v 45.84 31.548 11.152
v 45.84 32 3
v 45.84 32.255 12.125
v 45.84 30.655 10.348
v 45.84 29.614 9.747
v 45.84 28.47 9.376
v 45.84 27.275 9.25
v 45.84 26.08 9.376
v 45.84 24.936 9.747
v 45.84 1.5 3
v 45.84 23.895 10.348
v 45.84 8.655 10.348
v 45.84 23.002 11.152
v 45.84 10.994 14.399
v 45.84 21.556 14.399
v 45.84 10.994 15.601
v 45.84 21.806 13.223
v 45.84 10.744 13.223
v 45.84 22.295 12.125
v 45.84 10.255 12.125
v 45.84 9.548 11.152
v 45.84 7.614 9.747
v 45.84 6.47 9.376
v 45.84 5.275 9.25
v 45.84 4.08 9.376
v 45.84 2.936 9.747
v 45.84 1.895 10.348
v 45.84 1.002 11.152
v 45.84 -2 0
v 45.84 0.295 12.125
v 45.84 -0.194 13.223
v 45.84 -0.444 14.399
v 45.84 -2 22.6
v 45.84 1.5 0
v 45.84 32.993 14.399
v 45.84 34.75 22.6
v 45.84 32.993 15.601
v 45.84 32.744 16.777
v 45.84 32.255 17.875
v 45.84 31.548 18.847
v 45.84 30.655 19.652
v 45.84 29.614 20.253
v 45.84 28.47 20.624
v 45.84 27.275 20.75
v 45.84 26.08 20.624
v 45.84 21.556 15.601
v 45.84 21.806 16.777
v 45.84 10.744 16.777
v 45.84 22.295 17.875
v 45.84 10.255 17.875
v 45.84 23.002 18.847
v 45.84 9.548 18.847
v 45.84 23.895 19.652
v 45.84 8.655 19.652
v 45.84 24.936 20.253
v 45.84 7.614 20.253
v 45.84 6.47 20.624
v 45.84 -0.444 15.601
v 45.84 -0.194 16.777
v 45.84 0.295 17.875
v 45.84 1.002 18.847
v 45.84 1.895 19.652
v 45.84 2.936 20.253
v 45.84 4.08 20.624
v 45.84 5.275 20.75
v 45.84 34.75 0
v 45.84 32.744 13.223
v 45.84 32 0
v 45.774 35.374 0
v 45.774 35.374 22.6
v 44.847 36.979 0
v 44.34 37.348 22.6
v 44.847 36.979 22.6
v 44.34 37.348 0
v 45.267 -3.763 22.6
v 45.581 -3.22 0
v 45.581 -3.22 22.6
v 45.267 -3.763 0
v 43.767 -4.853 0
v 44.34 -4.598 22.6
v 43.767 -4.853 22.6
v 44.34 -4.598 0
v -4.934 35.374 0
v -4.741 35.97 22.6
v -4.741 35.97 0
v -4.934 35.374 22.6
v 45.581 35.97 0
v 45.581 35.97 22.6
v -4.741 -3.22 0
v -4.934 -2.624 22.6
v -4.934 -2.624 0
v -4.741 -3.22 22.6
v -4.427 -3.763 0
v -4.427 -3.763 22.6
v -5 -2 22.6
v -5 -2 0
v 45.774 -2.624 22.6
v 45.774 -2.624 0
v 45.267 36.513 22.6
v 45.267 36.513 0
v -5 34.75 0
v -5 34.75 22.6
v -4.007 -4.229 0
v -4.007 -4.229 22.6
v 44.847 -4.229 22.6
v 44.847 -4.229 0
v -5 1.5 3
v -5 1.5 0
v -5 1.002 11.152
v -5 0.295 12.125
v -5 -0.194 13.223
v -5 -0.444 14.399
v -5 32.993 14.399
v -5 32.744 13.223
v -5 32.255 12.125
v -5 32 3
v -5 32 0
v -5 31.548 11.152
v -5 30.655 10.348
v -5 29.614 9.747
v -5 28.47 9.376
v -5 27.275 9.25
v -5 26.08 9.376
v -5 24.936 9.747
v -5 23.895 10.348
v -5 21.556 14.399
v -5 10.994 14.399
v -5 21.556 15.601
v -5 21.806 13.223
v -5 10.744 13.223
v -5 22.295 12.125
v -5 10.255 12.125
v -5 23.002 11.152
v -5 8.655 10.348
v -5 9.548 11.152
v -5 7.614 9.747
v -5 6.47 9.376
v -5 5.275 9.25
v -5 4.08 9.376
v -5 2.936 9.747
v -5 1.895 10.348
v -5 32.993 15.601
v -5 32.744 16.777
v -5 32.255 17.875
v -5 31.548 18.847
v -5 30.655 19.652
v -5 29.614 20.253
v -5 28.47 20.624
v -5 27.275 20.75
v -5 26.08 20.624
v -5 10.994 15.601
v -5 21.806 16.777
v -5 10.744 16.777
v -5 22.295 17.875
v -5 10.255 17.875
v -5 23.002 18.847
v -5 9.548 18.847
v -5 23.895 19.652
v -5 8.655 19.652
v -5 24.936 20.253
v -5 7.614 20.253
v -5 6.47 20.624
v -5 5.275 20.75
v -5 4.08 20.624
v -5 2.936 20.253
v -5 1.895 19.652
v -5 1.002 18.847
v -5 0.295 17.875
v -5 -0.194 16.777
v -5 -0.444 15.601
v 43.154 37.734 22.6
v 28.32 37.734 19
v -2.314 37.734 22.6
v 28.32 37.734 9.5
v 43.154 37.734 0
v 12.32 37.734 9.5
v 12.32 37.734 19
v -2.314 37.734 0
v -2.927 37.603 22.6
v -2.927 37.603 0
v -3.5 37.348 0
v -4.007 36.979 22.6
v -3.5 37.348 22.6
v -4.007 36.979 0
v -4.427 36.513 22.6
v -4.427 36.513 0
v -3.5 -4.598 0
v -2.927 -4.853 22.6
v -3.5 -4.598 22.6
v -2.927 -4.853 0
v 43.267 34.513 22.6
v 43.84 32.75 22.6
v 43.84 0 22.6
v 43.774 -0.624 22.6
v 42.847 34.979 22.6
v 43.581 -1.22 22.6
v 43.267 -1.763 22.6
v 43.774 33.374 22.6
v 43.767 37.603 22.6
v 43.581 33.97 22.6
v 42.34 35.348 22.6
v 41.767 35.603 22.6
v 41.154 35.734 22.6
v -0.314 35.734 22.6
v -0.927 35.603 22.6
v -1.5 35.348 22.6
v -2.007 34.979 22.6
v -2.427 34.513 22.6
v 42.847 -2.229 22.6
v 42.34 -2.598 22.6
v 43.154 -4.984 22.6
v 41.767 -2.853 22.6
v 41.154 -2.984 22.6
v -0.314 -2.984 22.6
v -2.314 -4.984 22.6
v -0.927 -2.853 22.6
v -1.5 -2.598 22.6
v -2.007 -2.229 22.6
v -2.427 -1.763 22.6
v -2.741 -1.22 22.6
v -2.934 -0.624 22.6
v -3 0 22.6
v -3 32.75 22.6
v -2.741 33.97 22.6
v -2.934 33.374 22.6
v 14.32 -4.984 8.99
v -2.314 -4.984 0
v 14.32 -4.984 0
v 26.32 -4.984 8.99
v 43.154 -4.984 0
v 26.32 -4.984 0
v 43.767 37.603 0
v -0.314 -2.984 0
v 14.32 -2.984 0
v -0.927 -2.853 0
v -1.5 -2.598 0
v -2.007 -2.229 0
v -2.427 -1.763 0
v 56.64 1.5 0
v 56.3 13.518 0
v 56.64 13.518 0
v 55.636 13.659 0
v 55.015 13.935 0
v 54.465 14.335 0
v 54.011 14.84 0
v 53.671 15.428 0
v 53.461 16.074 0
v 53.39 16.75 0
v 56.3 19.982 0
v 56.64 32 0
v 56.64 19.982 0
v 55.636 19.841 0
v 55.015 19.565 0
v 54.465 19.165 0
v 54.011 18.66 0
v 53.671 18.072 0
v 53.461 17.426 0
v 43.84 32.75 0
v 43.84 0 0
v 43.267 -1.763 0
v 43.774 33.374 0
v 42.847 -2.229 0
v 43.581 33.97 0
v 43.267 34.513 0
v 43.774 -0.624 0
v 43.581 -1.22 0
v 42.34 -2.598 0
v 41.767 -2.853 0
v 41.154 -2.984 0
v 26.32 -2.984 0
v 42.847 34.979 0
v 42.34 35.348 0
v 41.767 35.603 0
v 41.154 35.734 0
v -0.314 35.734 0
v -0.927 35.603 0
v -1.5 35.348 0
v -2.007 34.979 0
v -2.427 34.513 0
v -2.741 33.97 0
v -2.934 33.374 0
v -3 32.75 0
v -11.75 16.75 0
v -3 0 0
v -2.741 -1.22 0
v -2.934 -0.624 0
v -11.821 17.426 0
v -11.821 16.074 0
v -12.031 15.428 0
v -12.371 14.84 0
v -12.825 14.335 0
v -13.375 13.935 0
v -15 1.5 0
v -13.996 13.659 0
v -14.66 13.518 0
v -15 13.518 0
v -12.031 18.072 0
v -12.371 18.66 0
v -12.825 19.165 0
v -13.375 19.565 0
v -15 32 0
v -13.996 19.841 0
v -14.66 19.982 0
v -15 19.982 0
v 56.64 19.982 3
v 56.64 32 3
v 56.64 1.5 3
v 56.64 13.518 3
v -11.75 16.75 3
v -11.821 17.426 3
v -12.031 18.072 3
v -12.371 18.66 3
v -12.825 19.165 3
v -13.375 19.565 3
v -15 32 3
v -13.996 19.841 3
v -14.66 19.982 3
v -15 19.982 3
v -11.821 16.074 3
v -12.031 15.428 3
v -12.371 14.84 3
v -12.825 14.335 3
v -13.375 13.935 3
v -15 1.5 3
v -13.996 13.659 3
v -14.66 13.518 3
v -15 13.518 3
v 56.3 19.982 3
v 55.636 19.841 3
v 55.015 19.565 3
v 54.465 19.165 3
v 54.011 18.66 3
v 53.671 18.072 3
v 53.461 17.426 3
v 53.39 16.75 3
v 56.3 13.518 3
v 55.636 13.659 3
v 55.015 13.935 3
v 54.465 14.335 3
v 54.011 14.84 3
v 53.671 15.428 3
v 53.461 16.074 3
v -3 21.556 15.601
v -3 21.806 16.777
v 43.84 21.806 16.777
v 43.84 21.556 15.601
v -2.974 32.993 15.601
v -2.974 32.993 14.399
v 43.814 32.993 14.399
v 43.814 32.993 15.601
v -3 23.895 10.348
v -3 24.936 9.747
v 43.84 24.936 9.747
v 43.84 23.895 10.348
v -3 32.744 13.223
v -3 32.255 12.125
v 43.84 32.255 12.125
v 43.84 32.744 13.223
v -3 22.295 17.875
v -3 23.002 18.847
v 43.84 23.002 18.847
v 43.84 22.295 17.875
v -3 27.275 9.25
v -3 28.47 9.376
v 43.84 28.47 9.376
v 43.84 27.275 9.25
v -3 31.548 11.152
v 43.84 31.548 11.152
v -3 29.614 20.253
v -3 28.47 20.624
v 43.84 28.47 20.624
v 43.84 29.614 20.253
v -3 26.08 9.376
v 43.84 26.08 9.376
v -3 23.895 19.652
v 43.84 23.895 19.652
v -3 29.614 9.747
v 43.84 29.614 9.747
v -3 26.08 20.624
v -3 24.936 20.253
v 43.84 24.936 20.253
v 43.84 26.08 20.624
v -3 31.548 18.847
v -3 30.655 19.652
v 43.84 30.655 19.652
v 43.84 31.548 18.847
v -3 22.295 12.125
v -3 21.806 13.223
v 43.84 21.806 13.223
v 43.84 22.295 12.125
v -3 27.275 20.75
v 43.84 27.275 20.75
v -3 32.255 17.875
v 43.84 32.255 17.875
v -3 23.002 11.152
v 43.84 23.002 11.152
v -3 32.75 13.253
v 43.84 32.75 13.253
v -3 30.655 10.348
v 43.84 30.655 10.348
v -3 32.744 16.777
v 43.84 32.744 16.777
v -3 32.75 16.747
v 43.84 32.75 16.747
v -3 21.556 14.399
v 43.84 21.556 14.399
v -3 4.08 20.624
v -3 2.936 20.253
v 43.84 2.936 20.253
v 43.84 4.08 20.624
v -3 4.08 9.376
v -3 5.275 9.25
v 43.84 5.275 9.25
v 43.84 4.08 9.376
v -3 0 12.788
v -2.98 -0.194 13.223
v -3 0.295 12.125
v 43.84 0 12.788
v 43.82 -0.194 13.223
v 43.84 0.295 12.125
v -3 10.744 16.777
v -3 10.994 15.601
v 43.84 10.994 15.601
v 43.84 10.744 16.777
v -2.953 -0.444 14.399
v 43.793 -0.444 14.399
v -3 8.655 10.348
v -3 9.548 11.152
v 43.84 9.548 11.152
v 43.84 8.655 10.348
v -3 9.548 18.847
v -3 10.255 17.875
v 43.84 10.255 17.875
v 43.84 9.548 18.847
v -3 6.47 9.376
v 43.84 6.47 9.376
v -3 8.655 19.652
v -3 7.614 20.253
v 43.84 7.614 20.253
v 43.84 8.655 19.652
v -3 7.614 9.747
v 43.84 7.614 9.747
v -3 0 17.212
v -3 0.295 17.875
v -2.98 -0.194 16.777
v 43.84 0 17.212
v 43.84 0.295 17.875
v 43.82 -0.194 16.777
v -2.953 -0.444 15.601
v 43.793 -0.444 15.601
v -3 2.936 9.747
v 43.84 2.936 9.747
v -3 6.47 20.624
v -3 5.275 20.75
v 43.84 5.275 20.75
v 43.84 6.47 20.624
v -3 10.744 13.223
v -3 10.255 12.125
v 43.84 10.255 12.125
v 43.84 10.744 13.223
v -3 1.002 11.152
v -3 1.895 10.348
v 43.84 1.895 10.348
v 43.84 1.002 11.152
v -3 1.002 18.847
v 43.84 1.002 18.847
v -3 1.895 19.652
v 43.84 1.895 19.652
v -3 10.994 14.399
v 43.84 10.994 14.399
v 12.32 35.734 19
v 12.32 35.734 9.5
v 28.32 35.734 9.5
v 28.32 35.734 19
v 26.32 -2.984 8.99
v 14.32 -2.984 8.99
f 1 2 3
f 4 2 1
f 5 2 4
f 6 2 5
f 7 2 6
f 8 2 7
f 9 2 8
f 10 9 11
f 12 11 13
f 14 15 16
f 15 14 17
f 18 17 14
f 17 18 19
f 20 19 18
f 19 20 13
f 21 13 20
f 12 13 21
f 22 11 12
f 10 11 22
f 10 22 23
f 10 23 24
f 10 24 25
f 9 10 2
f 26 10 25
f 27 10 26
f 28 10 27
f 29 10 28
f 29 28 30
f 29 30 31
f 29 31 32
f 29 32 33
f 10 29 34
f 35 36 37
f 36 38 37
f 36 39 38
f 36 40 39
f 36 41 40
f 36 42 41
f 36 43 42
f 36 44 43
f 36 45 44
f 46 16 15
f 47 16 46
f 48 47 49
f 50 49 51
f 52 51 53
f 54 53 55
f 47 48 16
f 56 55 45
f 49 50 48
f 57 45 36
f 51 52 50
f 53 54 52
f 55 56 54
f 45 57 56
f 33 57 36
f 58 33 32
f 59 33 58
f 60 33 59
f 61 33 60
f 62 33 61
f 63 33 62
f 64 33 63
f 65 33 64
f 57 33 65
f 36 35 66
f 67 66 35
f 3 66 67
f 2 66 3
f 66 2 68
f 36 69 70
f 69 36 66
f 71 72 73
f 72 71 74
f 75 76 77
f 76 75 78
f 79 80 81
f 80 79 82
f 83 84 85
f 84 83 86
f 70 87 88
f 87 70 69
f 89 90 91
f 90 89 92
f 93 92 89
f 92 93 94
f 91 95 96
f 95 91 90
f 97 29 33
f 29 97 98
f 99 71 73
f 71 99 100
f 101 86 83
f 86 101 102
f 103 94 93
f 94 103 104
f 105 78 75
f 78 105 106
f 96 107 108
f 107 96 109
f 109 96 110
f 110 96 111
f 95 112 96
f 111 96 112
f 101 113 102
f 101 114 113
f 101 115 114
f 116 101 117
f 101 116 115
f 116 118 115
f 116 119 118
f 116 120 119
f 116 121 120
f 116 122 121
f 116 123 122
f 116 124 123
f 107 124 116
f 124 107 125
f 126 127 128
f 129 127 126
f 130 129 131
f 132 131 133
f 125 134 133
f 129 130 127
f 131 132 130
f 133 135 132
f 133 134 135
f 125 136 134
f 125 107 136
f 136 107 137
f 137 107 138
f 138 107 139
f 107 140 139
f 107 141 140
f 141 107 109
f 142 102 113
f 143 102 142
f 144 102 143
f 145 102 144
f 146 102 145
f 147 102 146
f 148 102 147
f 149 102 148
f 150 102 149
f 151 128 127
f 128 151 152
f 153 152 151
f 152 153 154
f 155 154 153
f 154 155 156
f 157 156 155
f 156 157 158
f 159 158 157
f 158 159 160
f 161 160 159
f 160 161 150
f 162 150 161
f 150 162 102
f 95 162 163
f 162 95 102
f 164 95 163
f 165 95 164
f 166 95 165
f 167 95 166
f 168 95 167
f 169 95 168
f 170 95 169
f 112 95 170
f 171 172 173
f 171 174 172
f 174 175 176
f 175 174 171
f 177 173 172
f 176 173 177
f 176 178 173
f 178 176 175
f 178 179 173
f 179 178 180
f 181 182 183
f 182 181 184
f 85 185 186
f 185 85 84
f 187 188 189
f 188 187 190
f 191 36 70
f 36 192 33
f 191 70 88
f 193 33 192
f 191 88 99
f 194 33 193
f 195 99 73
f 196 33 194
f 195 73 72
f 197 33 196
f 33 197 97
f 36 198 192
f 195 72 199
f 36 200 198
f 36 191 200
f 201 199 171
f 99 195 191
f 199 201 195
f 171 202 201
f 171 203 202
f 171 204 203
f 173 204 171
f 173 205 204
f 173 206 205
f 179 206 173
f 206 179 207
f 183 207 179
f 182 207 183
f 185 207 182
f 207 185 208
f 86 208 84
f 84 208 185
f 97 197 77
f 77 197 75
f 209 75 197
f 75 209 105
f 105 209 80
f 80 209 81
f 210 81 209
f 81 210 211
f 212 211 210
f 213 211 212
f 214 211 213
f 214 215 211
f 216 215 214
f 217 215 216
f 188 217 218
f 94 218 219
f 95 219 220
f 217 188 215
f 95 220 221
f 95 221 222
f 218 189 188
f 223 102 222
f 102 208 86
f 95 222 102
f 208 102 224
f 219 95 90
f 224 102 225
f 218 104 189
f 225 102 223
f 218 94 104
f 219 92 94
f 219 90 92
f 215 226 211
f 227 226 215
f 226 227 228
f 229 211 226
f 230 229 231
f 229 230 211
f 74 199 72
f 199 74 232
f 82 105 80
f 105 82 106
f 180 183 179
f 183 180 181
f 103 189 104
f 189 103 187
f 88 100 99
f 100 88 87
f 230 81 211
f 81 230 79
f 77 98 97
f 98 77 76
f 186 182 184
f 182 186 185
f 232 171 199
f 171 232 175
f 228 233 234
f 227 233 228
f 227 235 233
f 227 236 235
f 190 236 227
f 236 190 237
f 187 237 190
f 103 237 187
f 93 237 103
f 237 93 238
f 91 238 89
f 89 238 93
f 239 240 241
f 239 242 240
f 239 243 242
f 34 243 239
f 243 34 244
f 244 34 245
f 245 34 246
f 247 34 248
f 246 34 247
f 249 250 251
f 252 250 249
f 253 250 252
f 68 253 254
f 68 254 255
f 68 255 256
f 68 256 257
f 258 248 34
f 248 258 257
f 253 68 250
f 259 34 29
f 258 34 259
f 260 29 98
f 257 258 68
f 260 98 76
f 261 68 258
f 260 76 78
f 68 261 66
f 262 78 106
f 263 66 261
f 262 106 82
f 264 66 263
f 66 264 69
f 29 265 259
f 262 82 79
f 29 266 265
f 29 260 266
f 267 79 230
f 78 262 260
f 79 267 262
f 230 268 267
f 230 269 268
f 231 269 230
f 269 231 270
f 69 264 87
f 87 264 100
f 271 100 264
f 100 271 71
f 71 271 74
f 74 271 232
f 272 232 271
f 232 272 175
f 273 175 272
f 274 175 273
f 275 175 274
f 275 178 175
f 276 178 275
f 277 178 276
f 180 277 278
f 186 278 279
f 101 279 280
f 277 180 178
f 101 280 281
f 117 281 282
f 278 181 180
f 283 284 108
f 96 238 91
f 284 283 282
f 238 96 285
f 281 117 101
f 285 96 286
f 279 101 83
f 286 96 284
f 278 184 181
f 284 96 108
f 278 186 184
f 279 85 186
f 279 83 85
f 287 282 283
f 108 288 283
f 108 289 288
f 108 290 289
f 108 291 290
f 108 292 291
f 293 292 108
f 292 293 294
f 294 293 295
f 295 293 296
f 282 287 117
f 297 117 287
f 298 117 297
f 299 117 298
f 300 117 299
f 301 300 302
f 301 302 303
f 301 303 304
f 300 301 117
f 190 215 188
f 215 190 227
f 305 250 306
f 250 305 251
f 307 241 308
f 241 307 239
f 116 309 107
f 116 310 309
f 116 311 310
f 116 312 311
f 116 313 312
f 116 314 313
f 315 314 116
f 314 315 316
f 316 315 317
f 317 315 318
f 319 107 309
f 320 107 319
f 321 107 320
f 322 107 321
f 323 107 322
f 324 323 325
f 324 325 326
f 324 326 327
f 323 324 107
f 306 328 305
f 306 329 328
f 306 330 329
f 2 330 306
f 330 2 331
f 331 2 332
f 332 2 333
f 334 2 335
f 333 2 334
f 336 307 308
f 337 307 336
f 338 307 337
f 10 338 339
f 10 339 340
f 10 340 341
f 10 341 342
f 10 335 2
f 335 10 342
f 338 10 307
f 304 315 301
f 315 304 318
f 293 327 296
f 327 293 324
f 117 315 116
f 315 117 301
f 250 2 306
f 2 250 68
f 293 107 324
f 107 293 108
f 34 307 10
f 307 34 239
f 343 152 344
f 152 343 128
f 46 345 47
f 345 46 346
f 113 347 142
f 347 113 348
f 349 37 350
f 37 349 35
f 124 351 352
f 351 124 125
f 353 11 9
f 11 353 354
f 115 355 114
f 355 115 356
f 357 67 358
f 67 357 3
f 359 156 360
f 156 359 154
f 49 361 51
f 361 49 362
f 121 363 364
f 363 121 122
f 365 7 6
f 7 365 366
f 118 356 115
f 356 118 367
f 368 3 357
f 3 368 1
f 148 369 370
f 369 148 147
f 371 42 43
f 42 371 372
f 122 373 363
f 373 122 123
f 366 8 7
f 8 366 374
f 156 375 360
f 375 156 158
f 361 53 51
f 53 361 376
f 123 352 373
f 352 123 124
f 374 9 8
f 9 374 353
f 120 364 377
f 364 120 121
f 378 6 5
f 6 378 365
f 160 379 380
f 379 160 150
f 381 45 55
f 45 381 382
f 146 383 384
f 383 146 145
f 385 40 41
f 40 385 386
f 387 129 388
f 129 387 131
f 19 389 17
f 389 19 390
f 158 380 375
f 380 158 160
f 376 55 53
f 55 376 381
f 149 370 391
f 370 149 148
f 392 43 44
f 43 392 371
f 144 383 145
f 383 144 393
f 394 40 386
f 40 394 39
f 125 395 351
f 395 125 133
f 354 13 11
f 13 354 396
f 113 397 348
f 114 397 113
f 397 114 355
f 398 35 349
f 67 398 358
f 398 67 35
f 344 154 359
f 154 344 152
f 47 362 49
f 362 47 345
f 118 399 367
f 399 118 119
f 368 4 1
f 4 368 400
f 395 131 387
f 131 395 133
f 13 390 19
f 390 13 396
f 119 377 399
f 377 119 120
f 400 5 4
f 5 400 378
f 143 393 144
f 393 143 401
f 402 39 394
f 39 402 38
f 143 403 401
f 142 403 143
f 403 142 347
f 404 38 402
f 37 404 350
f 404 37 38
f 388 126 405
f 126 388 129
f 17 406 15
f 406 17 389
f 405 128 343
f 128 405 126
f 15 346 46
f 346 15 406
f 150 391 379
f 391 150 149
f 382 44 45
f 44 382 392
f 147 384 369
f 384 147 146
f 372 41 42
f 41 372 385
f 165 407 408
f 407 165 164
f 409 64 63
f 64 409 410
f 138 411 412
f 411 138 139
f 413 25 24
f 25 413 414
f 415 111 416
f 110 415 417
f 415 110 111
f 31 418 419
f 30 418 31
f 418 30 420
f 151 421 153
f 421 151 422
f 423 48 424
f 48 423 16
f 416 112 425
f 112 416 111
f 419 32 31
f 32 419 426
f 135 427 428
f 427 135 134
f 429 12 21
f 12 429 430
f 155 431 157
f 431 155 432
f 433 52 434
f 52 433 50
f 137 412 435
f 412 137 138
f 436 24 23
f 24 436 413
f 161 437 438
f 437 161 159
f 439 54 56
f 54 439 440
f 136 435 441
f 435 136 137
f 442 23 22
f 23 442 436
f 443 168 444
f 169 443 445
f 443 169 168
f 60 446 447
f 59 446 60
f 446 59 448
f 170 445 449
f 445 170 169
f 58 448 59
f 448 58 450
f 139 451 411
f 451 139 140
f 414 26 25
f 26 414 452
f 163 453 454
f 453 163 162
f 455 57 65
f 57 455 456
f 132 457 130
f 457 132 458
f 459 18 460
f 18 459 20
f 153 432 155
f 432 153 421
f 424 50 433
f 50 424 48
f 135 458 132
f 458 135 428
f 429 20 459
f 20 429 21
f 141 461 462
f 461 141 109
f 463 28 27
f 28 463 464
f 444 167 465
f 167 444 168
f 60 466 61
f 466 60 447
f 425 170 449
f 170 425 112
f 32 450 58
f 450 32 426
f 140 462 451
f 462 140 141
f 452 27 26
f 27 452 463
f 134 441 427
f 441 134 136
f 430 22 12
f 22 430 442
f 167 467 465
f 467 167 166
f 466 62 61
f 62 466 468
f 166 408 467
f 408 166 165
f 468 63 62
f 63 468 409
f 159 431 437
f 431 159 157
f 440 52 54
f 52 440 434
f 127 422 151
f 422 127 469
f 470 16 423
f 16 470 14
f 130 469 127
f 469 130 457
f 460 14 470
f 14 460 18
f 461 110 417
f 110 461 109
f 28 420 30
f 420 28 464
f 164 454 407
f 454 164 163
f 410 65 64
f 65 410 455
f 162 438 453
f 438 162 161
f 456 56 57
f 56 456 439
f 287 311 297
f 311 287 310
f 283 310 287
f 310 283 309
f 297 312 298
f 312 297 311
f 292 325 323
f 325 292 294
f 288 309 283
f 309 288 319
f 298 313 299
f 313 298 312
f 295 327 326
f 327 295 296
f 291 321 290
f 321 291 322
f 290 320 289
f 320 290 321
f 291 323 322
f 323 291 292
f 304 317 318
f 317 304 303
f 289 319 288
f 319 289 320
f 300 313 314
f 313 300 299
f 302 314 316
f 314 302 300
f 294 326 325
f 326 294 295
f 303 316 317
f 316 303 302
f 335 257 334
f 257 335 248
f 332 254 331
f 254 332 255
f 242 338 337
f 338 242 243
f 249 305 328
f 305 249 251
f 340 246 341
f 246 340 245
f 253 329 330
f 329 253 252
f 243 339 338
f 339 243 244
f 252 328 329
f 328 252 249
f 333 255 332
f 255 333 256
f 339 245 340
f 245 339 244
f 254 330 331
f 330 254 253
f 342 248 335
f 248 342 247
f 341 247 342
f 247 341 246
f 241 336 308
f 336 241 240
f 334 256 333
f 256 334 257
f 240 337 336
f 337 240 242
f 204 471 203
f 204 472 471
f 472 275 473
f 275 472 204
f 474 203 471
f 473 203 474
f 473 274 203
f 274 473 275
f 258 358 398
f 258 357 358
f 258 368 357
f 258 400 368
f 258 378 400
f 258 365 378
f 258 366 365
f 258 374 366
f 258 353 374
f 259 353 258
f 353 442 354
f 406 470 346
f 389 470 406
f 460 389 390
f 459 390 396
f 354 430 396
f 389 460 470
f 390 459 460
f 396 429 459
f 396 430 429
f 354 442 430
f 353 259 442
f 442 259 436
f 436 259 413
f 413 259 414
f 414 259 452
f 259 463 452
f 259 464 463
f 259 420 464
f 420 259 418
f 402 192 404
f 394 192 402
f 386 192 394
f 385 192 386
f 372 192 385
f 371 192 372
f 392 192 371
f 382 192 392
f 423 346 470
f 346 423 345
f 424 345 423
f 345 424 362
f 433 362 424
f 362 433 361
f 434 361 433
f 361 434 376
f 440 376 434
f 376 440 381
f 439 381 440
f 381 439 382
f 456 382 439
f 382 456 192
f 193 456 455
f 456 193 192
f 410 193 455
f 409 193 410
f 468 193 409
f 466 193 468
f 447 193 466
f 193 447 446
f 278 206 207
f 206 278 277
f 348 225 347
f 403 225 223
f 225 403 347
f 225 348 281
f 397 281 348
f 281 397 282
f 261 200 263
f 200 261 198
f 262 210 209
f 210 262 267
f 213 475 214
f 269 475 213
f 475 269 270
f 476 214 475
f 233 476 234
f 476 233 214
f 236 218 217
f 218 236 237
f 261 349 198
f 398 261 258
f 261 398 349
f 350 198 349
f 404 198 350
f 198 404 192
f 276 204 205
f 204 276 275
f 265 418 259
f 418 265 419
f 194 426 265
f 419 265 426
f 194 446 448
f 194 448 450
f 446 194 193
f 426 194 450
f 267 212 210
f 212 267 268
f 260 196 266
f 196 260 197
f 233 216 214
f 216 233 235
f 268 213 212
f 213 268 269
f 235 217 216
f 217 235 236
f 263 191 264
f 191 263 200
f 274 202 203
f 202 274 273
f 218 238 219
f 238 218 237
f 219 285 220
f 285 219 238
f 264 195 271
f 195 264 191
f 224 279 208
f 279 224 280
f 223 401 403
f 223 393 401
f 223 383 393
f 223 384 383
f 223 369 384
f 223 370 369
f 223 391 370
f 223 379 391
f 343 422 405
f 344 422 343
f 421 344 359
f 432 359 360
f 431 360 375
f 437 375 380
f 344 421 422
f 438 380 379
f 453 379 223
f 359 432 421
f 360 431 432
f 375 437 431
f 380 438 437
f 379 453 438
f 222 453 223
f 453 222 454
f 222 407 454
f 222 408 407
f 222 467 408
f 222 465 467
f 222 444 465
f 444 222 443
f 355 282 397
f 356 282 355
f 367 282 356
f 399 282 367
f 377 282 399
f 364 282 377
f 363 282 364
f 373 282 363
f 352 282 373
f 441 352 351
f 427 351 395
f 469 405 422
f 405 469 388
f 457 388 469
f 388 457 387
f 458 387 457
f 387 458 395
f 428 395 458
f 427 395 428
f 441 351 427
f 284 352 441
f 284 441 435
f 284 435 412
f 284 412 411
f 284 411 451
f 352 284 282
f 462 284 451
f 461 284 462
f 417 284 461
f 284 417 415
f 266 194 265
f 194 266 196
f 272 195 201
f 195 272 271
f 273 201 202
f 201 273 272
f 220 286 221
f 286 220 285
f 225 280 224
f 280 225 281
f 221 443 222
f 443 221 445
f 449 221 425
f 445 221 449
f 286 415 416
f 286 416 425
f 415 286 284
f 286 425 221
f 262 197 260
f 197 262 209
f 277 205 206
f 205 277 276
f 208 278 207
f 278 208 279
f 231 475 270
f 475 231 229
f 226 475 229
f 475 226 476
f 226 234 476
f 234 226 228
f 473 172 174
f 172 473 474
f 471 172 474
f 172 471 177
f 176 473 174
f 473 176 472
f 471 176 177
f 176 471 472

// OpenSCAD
// file: ../src/IMU_CAN_adapter.scad
include <../parameters.scad>

IMU_diameter = 6;
IMU_width = 38.55;
IMU_height = 22.6;
IMU_length = 46.64;

cable_dia = 10.5+1;
cable_height = 15;
cable_gap = 22;

left_conn_width = 12;
left_conn_height = 9;

right_conn_width = 16;
right_conn_height = 9.5;
right_conn_bot_gap = 7.5;

module IMU_CAN_adapter() {
	difference() {
		// whole body
		union() {
			translate([-2, -2, 0])
			minkowski() {
				cube([IMU_length-IMU_diameter+4.2, IMU_width-IMU_diameter+4.2, 1]);
				cylinder(d=6, h=IMU_height-1, $fn=30);
			}

			translate([-5-10, IMU_diameter/4, 0])
			cube([IMU_length+5+20, ALU_profile_width, 3]);
		}

		// holding screws
		translate([-5-10, ALU_profile_width/2+IMU_diameter/4, -1])
		cylinder(d=M6_screw_diameter, h=5, $fn=30);

		translate([IMU_length+10, ALU_profile_width/2+IMU_diameter/4, -1])
		cylinder(d=M6_screw_diameter, h=5, $fn=30);

		// IMU inside cutout
		translate([0, 0, -1])
		minkowski() {
			cube([IMU_length-IMU_diameter+0.2, IMU_width-IMU_diameter+0.2, 1]);
			cylinder(d=6, h=IMU_height+1, $fn=30);
		}

		// cable holes
		translate([0, 0, cable_height])
		union() {
			rotate([0, 90, 0])
			translate([0, (IMU_width-IMU_diameter+cable_gap)/2, -10])
			cylinder(d=cable_dia, h=IMU_length+10, $fn=30);

			rotate([0, 90, 0])
			translate([0, (IMU_width-IMU_diameter-cable_gap)/2, -10])
			cylinder(d=cable_dia, h=IMU_length+10, $fn=30);
		}

		// left connector hole
		translate([-3+IMU_length/2-left_conn_width/2, -5, -.01])
		cube([left_conn_width, 10, left_conn_height]);

		// right connector hole
		translate([-3+IMU_length/2-right_conn_width/2, -5+IMU_width, right_conn_height])
		cube([right_conn_width, 10, right_conn_height]);
	}
}

IMU_CAN_adapter();
// file: ../parameters.scad
maximum_printable_size = 150;

layer_thickness = 0.2;
base_patern = 10;
global_clearance = 0.2;
clearance = global_clearance;


//Screw diameter and nut for M10 [mm]
M10_screw_diameter = 10.4;
M10_head_height = 10;
M10_head_diameter = 16+0.5;
M10_nut_height = 10.5;
M10_nut_diameter = 25.5;
M10_nut_pocket = 22.3;

//Screw diameter for M8 [mm]
M8_screw_diameter = 8.6;
M8_head_height = 8;
M8_head_diameter = 13.5;
M8_nut_height = 7.5;
M8_square_nut_thin_height = 4.5;
M8_nut_diameter = 14.4 + 0.5;
M8_nut_pocket = 13 + 0.5;
M8_washer_diameter = 16;
M8_washer_thickness = 1.5;


//Screw diameter and nut for M6 [mm]
M6_screw_diameter=6.5;
M6_head_diameter = 10+0.5;
M6_head_height = 6;
M6_nut_height = 4.9;
M6_nut_diameter = 11.8;
M6_nut_pocket = 10.4;
M6_square_nut_height = 3;
M6_square_nut_diameter = 10;
M6_washer_thickness = 1.6;

//Screw diameter and nut for M5 [mm]
M5_screw_diameter=5.5;
M5_head_height = 5;
M5_head_diameter = 13+0.5;
M5_nut_height = 4.5;
M5_nut_diameter = 9.4;
M5_nut_pocket = 8.4;

//Screw diameter and nut for M4 [mm]
M4_screw_diameter=4.5;
M4_screw_head_height = 4;
M4_nut_height = 3.2;
M4_nut_diameter = 8.4;
M4_nut_pocket = 7.5;

//Screw diameter and nut for M3 [mm]
M3_screw_diameter = 3.2;
M3_nut_height = 2.7;
M3_nut_diameter = 6.6;
M3_nut_pocket = 5.6;
M3_screw_head_height = 3;

//Screw diameter and nut for M2,5 [mm]
M2_5_screw_diameter = 2.7;
M2_5_nut_height = 2.3;
M2_5_nut_diameter = 6;
M2_5_nut_pocket = 5.5;

// kulove lozisko

bearing_efsm_08_h = 33+1;
bearing_efsm_08_m = 22;
bearing_efsm_08_db = 18;
bearing_efsm_08_ag = 10.5;
bearing_efsm_08_n = M4_screw_diameter;
bearing_efsm_08_a1 = 5.5;
bearing_efsm_08_d = 8.25;
bearing_efsm_08_B = 8; // ball height

bearing_efsm_10_h = 38+1;
bearing_efsm_10_m = 26;
bearing_efsm_10_db = 21.9;
bearing_efsm_10_ag = 12+0.2;
bearing_efsm_10_n = M5_screw_diameter;
bearing_efsm_10_a1 = 6.5;
bearing_efsm_10_d = 10.25;


bearing_efsm_12_width = 40+1;
bearing_efsm_12_h = bearing_efsm_12_width;
bearing_efsm_12_boltd = 28/2; // polovina vzdalenosti mezi srouby
bearing_efsm_12_m = bearing_efsm_12_boltd*2;
bearing_efsm_12_db = 25;
bearing_efsm_12_ag = 13;
bearing_efsm_12_a1 = 7;
bearing_efsm_12_n = M5_screw_diameter;
bearing_efsm_12_d = 12.15;
bearing_efsm_12_B = 10; // ball height
bearing_efsm_space = 1;

bearing_efsm_17_width = 54+1;
bearing_efsm_17_h = bearing_efsm_17_width;
bearing_efsm_17_boltd = 38/2; // polovina vzdalenosti mezi srouby
bearing_efsm_17_m = bearing_efsm_17_boltd*2;
bearing_efsm_17_db = 35;
bearing_efsm_17_ag = 18;
bearing_efsm_17_n = M6_screw_diameter;
bearing_efsm_17_a1 = 10;
bearing_efsm_17_B = 17; // ball height

//limcove lozisko
bearing_EFOM_10_L=26; //celkova sirka zakladny
bearing_EFOM_10_d1=10.3;//diametr otvoru real=10 mm
bearing_EFOM_10_dB=22;//diametr vystupku pro ulozeni lozika
bearing_EFOM_10_H=52;//celková delka zakladny
bearing_EFOM_10_J=36;// hole pitch
bearing_EFOM_10_A1=6.5;//vyska pouzdra
bearing_EFOM_10_Ag=12;//celkova vyska
bearing_EFOM_10_N1=5;//sirka otvoru pro sroub
bearing_EFOM_10_N2=8;//delka otvoru pro sroub
bearing_EFOM_10_m=36;//roztec der pro sroub
bearing_EFOM_10_h=9;//vyska lozika


608_bearing_outer_diameter = 22.3;
608_bearing_inner_diameter = 16;
608_bearing_thickness = 7.1;


// 20 KG servo parameters

servo_20kg_axis_offset = 9.375; // jak je osa mimo stredu
servo_20kg_body_x = 42;
servo_20kg_body_y = 21;
servo_20kg_body_z = 40;
servo_20kg_thread_x = 49/2;
servo_20kg_thread_y = 10/2;
servo_20kg_body_below = 10; // jak hluboko je tělo serva pod drzaky na srouby
servo_20kg_below = 25.8; // jak hluboko je páka serva pod drzaky na srouby

servo_20kg_bolt_d = 2.5+0.3;
servo_20kg_nut_d = 5+0.3;


//strain gauge
strain_gauge_width = 12.7;
strain_gauge_length = 75.1;
strain_gauge_screw_distance = 10;

//ALU profile
ALU_profile_width = 30.5;
ALU_profile_holder_wall_thickness = 3;
ALU_profile_groove_width = 8;

//pillow block bearing
//https://www.igus.eu/product/372
//Part no. KSTM-08
KSTM08_screws_distance = 33;         //m
KSTM08_screws_holes_diameter = 4.5;  //d2
KSTM08_flange_thickness = 6;         //h3
KSTM08_case_width = 9;               //C1
KSTM08_case_length = 47;             //a
KSTM08_ball_width = 12;              //B
KSTM08_ball_hole_diameter = 7.85;    //d1


//ložiska pro malý rotor
bearing_outer_diameter = 10.2;    // Rozměr B1 v nákresu s přídavkem na toleranci otvoru
bearing_thickness = 4;        // Rozměr B2 v nákresu
//bearing_shaft_length = 19.5;    // Rozměr B3 v nákresu, Originalni hodnota 19.5
bearing_shaft_length = 20;    // Rozměr B3 v nákresu


//parametry víčka s telemetrickou anténou
S01_sila_materialu=1.2;
S01_vyska_horni_zavit=10;
S01_hloubka_zavitu=4;
S01_prumer_vnitrni=50;
LO_spodni_prumer=17.2;
LO_vyska_bez_krytu=15;
S01_tolerance_zavit=1.5;
R01_vyska_prekryti_statoru=10;

g3_0_cone1 = 70;
g3_0_srcew_dist = 55;



// scale parameters
base_length = 500;
base_width = 500;
front_tower_offset = 120;
back_tower_offset = 163.5;
tower_height = 375;
tower_angle = atan((base_width/2-ALU_profile_width-10)/tower_height);
tower_arm_length = tower_height/cos(tower_angle);
tower_drag_z_offset = 22;
electro_box_length = 225;
electro_box_width = 165;
electro_box_height = 51.5;

// calibration device parameters
calibration_arm_x_offset = 140;
calibration_arm_y_offset = 50;





// Engine and engine holder parameters

motor_holder_height = base_patern * 5;
motor_holder_thickness = 5;
motor_holder_motor_height = 25;
motor_holder_side_mount_height = base_patern*2.5;
pylon_holder_side_mount_height = base_patern*4.5;

engine_angle = -5; // ongle of engine axis relative to fuselage main axis
engine_diameter = 55;
engine_offset = 53;			// Posun motoru v ose X (dopredu)




// Parametry pro hacek na kabely od motoru
	motor_wire_holder_width = 5;
	motor_wire_holder_height = 10;
	motor_wire_holder_space = 3;
	motor_wire_holder_thickness = 2.5;
	motor_wire_holder_z_shift = 10;
	motor_wire_holder_x_shift = 19;

// Parametry pro ochranny ram nad motorem 
	motor_protective_frame_x_shift = 20;
	motor_protective_frame_z_base = 32;
	motor_protective_frame_beam_width = 5;
	motor_protective_frame_beam_thickness = 3;
	motor_protective_frame_width = base_width-3;
	motor_protective_frame_plug_thickness = 2;
	motor_protective_frame_plug_length = 4;
	motor_protective_frame_thickness = 5;
	motor_protective_frame_z_scale = 0.75;
// main file
//@set_slicing_config(../slicing/default.ini)

include <../parameters.scad>
use <../src/IMU_CAN_adapter.scad>

IMU_CAN_adapter();
